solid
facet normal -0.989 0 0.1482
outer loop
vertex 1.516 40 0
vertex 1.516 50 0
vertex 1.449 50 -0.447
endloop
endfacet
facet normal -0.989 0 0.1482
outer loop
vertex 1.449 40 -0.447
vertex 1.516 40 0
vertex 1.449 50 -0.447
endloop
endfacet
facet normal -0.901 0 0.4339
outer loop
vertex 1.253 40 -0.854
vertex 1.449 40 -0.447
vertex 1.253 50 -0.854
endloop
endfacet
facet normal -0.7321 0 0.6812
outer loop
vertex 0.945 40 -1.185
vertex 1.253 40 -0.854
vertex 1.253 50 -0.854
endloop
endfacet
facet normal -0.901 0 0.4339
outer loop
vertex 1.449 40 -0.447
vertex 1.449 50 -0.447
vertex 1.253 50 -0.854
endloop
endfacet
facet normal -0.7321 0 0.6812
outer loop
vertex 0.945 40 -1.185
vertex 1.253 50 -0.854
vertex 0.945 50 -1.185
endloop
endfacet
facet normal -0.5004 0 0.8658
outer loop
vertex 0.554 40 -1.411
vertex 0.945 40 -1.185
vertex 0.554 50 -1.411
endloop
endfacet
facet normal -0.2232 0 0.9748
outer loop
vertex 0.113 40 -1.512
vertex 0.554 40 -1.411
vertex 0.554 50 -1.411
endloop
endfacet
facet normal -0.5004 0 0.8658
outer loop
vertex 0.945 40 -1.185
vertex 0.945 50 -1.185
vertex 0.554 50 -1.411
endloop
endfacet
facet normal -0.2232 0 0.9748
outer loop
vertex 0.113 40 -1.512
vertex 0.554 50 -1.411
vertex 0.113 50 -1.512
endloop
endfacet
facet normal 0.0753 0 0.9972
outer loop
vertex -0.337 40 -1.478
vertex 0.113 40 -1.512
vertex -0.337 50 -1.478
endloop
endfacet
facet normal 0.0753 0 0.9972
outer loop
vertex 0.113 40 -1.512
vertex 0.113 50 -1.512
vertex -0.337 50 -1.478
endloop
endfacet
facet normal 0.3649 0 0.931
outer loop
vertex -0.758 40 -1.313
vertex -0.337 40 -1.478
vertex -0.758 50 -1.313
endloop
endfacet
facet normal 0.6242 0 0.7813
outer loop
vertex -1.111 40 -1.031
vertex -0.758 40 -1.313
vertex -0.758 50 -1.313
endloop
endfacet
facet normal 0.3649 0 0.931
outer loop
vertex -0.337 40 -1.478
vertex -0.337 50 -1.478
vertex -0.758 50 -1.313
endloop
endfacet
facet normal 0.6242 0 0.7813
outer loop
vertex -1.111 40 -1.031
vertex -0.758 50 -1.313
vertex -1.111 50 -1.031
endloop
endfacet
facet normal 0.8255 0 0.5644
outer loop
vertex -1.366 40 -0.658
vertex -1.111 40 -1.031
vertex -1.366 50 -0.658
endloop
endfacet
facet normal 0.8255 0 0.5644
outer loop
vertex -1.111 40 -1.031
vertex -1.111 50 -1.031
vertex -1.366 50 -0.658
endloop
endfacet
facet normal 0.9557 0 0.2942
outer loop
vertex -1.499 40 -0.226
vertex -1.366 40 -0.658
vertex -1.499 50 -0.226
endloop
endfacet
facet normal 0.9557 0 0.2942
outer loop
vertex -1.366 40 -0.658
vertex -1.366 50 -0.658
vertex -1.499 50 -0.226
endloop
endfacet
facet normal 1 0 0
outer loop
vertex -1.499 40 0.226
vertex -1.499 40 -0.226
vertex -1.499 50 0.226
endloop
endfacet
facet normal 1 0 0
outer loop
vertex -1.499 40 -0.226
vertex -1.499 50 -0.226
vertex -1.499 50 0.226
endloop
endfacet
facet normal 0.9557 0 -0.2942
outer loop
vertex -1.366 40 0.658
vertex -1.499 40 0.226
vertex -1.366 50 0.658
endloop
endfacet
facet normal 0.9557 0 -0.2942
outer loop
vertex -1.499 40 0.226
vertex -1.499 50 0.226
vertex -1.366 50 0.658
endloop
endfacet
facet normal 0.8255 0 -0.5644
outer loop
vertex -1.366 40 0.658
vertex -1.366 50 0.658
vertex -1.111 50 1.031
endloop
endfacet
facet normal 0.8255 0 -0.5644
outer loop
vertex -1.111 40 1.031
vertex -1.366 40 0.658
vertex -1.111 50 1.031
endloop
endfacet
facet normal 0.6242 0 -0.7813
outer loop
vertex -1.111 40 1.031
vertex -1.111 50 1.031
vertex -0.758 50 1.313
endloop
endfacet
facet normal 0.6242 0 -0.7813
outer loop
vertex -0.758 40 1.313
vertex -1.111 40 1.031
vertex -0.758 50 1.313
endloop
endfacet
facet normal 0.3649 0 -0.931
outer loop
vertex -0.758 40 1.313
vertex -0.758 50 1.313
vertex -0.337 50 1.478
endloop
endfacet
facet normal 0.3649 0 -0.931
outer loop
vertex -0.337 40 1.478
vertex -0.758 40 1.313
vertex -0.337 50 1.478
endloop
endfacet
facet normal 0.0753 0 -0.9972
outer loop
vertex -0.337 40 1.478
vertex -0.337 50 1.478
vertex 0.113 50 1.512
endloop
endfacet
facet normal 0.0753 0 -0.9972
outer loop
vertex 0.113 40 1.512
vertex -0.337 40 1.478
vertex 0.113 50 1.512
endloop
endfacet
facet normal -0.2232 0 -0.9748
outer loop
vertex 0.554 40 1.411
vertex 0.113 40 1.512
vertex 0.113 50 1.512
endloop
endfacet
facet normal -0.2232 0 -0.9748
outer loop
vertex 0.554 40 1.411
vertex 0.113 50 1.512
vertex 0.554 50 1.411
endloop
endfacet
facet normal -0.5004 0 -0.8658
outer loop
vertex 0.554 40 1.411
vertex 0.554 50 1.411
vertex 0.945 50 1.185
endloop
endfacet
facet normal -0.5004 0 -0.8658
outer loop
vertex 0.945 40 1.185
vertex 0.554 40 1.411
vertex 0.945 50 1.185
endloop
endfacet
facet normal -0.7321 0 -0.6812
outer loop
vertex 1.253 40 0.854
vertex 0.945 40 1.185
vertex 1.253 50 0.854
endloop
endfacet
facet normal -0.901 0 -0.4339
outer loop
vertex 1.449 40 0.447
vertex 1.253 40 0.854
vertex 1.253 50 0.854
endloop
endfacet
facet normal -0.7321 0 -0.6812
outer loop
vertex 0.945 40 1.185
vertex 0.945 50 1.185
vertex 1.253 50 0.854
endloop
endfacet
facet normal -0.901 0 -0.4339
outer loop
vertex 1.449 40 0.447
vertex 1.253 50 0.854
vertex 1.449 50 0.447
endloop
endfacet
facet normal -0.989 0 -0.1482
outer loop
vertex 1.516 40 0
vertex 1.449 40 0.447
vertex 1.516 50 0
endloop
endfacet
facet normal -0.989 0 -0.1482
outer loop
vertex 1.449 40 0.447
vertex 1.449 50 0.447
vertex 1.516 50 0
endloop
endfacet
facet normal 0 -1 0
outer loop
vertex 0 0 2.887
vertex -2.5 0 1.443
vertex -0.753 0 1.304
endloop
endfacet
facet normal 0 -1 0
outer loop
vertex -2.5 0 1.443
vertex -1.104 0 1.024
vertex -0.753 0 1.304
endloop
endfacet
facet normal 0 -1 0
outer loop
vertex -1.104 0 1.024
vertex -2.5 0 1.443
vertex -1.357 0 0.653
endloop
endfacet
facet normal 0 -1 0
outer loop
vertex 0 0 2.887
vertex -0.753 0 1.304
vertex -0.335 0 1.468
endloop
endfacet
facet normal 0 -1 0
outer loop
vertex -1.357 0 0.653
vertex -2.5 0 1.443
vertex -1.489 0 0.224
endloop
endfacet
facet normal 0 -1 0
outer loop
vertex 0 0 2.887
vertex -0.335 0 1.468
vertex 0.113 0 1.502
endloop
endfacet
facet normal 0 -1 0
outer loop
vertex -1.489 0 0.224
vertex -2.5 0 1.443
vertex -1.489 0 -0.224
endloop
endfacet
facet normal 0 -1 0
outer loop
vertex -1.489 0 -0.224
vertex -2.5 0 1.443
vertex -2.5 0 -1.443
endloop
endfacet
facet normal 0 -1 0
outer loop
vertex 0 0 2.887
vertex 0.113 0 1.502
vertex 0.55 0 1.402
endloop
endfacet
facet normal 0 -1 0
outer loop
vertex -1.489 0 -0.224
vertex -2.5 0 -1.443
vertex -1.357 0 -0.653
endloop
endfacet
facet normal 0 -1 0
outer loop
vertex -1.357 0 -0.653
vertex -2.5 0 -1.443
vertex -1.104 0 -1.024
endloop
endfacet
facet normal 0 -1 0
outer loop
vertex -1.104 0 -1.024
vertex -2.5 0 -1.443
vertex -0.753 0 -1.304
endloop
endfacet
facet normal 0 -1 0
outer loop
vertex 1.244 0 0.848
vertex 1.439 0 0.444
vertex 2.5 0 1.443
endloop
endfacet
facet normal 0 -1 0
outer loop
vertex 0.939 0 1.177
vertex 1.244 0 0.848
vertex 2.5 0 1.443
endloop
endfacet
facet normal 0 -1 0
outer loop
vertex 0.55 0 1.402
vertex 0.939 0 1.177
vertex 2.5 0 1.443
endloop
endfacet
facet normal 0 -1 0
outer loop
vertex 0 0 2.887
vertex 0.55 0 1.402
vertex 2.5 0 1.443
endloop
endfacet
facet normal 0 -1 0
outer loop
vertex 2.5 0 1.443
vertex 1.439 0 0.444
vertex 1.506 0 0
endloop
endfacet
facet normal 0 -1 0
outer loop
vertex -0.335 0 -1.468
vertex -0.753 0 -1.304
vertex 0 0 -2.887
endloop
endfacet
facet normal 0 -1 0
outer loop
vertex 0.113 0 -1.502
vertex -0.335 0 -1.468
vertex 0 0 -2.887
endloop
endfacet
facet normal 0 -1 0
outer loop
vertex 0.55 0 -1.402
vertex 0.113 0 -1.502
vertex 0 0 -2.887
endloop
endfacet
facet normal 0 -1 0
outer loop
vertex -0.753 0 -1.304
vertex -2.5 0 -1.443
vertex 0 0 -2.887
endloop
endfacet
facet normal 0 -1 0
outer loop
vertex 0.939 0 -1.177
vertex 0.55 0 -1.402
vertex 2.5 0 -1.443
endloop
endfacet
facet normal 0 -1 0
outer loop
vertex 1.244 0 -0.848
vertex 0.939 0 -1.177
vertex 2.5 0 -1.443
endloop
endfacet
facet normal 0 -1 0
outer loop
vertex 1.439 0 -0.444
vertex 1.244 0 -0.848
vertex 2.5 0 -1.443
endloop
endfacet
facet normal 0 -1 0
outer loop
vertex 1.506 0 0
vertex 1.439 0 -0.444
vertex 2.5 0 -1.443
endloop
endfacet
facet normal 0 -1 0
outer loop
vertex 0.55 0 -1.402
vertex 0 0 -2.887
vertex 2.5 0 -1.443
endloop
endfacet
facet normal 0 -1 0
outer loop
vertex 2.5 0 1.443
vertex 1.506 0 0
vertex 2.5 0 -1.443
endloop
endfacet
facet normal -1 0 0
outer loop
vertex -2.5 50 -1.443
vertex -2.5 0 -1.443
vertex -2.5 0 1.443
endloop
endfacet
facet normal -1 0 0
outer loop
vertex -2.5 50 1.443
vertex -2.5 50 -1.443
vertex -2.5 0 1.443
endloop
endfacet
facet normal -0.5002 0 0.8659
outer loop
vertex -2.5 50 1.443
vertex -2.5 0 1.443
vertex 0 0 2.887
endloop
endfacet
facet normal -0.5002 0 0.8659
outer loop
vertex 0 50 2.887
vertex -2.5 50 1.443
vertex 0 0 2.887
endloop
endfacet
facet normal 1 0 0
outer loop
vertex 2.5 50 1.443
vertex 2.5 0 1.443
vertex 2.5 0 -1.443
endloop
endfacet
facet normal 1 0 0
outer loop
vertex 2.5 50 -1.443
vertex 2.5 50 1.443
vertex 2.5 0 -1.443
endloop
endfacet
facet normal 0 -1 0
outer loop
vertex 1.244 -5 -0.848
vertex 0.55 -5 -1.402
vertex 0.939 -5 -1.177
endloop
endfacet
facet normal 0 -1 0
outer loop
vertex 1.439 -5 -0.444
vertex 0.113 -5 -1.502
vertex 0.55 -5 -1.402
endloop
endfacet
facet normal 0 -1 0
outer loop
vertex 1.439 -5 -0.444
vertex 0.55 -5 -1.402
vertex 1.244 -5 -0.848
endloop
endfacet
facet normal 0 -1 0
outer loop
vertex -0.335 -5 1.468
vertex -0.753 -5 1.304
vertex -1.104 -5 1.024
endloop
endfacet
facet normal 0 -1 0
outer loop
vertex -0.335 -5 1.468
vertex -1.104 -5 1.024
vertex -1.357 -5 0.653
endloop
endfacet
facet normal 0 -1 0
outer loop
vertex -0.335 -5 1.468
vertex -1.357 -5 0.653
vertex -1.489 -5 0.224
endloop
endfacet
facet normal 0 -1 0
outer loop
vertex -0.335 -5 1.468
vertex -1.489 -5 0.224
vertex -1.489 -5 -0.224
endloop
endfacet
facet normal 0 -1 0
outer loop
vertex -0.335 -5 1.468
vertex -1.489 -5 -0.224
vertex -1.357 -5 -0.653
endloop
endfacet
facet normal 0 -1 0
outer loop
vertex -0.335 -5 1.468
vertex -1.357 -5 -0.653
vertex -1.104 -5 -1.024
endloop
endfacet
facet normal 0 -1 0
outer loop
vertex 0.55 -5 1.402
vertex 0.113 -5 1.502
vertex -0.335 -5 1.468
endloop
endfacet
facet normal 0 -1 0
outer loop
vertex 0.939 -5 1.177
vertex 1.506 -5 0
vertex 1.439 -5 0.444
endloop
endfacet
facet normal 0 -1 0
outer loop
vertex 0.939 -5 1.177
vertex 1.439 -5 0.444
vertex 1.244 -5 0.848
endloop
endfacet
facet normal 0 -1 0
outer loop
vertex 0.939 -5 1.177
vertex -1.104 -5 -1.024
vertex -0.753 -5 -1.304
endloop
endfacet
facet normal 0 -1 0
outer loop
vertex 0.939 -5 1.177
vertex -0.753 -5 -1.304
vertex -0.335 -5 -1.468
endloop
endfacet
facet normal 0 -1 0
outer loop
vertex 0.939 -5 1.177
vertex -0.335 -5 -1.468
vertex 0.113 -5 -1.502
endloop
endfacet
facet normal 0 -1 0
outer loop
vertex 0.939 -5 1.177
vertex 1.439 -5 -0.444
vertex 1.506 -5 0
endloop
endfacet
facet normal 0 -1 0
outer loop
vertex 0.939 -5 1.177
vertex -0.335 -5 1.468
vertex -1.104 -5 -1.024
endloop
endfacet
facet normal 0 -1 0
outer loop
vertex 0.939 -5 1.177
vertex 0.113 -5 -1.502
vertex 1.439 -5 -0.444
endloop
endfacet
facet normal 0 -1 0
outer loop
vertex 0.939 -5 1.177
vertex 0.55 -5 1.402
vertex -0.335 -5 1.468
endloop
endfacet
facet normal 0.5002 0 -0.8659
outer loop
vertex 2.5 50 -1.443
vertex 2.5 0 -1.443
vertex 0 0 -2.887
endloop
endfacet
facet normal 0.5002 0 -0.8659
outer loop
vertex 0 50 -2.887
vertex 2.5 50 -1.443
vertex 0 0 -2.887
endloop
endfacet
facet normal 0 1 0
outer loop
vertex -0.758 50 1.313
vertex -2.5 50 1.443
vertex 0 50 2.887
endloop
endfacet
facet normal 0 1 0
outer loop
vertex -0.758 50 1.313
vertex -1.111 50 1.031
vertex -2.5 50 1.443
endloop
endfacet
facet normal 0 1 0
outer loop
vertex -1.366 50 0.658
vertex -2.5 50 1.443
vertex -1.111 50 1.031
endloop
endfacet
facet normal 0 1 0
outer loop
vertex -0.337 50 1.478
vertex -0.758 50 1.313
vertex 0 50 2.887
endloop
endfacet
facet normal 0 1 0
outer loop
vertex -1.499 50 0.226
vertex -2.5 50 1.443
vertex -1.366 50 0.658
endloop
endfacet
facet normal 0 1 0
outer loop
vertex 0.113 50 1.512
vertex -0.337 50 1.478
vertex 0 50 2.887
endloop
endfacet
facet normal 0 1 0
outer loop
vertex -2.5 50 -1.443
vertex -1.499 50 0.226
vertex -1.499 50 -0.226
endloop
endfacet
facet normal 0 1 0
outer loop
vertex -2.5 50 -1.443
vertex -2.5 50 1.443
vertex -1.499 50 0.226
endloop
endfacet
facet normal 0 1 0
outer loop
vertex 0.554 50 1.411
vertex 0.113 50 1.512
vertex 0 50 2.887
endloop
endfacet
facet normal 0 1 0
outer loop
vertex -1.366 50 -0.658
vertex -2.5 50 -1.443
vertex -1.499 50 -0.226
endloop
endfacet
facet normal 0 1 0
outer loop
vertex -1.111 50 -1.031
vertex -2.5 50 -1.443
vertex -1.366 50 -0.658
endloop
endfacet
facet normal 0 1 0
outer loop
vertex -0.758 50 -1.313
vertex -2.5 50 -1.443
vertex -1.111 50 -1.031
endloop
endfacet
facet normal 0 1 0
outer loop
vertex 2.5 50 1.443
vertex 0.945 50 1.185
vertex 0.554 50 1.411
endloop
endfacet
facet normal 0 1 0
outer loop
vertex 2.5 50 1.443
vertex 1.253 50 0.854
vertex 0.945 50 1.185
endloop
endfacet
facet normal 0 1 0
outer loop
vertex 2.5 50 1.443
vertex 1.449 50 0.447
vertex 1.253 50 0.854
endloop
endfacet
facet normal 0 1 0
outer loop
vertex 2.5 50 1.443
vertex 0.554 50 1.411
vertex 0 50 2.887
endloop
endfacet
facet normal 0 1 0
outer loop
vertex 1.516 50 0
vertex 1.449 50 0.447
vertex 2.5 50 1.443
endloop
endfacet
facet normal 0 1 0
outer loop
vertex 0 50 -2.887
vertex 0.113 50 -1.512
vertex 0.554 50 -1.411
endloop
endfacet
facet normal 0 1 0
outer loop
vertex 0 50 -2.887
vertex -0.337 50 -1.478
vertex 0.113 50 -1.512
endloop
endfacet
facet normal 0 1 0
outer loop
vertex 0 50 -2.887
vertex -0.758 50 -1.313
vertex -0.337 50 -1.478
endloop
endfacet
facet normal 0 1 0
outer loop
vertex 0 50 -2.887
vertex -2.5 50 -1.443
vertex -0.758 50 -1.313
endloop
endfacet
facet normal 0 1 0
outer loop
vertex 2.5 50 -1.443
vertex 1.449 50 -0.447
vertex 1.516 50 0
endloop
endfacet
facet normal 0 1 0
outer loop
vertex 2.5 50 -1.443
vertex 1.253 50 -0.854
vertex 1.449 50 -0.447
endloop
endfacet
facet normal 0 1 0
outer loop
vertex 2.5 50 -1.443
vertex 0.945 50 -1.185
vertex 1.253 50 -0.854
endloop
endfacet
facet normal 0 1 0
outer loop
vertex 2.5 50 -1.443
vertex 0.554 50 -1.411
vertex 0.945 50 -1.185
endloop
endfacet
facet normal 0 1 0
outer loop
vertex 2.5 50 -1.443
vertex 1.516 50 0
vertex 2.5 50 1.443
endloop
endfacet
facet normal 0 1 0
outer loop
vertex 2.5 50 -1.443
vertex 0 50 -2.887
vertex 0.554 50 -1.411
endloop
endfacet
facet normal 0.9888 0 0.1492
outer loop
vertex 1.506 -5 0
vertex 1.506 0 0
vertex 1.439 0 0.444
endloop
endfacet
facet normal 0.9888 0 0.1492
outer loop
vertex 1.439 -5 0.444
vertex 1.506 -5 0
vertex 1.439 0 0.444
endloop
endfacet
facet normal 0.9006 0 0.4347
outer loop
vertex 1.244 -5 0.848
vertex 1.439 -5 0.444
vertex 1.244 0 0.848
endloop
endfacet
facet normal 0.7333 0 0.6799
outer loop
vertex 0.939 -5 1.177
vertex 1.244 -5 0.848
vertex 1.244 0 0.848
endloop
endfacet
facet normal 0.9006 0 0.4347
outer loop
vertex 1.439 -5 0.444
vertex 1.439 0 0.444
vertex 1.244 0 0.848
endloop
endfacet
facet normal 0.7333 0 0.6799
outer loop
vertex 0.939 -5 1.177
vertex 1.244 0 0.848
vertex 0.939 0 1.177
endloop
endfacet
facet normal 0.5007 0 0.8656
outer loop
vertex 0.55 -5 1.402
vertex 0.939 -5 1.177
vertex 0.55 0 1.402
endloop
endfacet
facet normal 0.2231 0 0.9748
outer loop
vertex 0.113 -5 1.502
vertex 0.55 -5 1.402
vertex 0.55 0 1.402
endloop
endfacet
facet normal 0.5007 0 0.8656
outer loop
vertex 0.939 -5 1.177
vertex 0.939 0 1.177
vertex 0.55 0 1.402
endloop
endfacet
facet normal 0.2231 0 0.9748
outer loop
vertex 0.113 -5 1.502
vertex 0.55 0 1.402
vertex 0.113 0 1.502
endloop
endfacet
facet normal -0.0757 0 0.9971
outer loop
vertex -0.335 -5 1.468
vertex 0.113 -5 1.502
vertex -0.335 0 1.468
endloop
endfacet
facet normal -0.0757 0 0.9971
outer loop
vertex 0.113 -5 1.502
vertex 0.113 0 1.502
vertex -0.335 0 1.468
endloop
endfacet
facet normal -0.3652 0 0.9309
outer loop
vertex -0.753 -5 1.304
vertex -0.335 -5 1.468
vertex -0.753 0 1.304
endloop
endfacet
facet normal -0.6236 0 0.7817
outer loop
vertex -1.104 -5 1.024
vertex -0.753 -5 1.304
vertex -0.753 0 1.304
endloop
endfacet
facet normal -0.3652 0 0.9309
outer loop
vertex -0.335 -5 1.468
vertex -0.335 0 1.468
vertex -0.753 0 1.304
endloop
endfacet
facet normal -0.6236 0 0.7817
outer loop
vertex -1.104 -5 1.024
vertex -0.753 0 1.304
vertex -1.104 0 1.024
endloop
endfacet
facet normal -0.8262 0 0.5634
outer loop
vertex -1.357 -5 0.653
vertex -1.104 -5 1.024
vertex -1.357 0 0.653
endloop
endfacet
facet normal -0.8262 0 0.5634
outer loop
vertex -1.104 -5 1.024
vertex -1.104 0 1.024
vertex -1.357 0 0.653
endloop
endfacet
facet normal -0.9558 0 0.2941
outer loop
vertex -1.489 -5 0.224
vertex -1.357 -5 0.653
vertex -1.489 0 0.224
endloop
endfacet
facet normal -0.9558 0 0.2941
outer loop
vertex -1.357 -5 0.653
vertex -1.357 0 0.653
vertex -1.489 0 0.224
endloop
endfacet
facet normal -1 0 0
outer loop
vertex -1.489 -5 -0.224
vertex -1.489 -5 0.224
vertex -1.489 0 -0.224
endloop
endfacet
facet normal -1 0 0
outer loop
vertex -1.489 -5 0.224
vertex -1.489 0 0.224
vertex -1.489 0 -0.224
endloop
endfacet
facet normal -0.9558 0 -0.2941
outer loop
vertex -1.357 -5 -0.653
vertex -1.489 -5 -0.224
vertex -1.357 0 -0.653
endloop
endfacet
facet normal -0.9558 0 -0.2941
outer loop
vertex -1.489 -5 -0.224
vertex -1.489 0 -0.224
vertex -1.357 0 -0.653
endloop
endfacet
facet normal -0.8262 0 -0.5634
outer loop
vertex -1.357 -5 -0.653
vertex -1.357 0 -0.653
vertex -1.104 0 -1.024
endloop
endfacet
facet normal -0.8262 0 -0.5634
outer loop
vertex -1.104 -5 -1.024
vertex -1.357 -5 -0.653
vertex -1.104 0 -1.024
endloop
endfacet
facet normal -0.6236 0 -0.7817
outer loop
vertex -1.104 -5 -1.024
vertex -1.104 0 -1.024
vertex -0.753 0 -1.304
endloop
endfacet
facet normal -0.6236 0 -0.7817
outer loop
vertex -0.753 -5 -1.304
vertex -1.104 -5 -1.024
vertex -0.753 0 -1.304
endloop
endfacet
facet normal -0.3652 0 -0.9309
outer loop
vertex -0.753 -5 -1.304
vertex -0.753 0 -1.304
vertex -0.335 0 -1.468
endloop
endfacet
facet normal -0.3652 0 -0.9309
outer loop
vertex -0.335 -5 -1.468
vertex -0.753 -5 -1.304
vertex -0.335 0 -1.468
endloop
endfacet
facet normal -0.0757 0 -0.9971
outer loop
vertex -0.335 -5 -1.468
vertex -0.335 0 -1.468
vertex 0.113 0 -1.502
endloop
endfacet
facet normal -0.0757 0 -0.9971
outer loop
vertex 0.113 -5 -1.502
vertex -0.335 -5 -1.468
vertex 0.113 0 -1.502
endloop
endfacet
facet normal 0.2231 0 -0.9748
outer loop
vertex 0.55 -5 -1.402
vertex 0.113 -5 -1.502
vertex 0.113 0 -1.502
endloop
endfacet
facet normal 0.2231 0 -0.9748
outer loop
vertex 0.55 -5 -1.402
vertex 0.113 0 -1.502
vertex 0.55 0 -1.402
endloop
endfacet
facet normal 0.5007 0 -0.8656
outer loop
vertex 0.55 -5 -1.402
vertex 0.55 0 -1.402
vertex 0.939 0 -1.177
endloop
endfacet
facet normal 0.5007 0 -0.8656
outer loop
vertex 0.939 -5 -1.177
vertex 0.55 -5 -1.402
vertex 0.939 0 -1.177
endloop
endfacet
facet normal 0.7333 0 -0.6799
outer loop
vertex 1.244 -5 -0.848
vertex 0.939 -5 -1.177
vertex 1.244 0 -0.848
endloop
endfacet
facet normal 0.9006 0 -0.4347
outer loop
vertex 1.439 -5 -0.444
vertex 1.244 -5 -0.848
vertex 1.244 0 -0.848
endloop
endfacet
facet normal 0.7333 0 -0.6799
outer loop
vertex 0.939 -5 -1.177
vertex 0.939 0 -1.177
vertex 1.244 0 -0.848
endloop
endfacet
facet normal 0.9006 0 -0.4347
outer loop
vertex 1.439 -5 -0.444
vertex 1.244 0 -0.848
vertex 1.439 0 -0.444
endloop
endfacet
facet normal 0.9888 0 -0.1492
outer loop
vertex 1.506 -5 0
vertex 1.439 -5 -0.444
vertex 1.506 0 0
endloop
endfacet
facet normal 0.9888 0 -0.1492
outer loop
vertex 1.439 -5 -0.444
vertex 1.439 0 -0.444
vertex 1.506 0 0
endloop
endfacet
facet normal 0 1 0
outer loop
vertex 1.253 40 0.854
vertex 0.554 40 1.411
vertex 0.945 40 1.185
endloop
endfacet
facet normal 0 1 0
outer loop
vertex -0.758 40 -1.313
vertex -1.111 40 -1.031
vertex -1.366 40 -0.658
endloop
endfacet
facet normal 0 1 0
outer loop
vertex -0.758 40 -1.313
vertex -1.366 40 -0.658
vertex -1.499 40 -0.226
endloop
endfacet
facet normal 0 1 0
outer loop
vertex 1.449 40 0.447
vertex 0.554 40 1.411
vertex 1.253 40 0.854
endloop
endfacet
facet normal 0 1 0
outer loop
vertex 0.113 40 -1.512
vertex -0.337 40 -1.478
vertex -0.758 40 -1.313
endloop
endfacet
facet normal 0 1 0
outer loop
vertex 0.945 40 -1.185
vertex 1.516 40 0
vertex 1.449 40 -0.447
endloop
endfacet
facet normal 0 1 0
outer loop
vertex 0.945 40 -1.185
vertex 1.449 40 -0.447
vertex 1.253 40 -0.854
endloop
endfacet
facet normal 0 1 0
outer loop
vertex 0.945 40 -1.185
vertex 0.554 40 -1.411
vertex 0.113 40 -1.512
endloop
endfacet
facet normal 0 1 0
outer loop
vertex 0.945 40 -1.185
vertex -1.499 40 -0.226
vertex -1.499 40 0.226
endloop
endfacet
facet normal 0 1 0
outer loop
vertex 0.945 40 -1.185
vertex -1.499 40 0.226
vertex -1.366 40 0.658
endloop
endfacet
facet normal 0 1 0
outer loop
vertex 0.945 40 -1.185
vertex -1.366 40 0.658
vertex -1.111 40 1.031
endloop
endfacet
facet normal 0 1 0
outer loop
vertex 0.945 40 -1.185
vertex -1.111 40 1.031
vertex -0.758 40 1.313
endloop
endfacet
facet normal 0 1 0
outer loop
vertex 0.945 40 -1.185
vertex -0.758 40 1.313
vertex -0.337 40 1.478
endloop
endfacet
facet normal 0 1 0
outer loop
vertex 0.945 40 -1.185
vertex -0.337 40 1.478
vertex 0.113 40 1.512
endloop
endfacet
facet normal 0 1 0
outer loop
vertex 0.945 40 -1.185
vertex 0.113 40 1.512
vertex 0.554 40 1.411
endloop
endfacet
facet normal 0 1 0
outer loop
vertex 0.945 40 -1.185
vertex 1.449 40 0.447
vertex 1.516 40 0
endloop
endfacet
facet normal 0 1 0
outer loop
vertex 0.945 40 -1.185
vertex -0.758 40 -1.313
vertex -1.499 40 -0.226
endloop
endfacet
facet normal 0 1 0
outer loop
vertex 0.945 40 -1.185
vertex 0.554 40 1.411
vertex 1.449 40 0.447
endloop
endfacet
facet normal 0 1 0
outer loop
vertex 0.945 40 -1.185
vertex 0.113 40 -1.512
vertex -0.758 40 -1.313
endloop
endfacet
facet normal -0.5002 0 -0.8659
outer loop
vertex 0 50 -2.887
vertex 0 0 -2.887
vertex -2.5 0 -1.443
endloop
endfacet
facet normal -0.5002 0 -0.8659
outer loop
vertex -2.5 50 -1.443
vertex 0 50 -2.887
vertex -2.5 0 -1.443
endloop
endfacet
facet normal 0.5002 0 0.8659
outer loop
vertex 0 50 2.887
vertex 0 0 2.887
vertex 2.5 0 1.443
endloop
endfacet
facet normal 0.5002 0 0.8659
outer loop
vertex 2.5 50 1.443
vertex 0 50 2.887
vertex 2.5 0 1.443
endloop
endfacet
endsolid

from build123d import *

# Parameters (mm, degrees)
BOSS_EXTRUDE1_DEPTH = 50
SKETCH2_R           = 1.516102493
CUT_EXTRUDE1_DEPTH  = 10
SKETCH3_R           = 1.505855903
BOSS_EXTRUDE2_DEPTH = 5


with BuildPart() as part:
    # Sketch1 → Boss-Extrude1 (new body)
    with BuildSketch(Plane(origin=(0, 0, 0), x_dir=(1, 0, 0), z_dir=(0, 1, 0))):
        Polygon((0, -2.886751346), (2.5, -1.443375673), (2.5, 1.443375673), (0, 2.886751346), (-2.5, 1.443375673), (-2.5, -1.443375673), align=None)
    extrude(amount=BOSS_EXTRUDE1_DEPTH)

    # Sketch2 → Cut-Extrude1 (cut)
    with BuildSketch(Plane(origin=(0, 50, 0), x_dir=(1, 0, 0), z_dir=(0, 1, 0))):
        Circle(SKETCH2_R)
    extrude(amount=-CUT_EXTRUDE1_DEPTH, mode=Mode.SUBTRACT)

    # Sketch3 → Boss-Extrude2 (add)
    with BuildSketch(Plane.XZ):
        Circle(SKETCH3_R)
    extrude(amount=BOSS_EXTRUDE2_DEPTH)


solid = part.part
